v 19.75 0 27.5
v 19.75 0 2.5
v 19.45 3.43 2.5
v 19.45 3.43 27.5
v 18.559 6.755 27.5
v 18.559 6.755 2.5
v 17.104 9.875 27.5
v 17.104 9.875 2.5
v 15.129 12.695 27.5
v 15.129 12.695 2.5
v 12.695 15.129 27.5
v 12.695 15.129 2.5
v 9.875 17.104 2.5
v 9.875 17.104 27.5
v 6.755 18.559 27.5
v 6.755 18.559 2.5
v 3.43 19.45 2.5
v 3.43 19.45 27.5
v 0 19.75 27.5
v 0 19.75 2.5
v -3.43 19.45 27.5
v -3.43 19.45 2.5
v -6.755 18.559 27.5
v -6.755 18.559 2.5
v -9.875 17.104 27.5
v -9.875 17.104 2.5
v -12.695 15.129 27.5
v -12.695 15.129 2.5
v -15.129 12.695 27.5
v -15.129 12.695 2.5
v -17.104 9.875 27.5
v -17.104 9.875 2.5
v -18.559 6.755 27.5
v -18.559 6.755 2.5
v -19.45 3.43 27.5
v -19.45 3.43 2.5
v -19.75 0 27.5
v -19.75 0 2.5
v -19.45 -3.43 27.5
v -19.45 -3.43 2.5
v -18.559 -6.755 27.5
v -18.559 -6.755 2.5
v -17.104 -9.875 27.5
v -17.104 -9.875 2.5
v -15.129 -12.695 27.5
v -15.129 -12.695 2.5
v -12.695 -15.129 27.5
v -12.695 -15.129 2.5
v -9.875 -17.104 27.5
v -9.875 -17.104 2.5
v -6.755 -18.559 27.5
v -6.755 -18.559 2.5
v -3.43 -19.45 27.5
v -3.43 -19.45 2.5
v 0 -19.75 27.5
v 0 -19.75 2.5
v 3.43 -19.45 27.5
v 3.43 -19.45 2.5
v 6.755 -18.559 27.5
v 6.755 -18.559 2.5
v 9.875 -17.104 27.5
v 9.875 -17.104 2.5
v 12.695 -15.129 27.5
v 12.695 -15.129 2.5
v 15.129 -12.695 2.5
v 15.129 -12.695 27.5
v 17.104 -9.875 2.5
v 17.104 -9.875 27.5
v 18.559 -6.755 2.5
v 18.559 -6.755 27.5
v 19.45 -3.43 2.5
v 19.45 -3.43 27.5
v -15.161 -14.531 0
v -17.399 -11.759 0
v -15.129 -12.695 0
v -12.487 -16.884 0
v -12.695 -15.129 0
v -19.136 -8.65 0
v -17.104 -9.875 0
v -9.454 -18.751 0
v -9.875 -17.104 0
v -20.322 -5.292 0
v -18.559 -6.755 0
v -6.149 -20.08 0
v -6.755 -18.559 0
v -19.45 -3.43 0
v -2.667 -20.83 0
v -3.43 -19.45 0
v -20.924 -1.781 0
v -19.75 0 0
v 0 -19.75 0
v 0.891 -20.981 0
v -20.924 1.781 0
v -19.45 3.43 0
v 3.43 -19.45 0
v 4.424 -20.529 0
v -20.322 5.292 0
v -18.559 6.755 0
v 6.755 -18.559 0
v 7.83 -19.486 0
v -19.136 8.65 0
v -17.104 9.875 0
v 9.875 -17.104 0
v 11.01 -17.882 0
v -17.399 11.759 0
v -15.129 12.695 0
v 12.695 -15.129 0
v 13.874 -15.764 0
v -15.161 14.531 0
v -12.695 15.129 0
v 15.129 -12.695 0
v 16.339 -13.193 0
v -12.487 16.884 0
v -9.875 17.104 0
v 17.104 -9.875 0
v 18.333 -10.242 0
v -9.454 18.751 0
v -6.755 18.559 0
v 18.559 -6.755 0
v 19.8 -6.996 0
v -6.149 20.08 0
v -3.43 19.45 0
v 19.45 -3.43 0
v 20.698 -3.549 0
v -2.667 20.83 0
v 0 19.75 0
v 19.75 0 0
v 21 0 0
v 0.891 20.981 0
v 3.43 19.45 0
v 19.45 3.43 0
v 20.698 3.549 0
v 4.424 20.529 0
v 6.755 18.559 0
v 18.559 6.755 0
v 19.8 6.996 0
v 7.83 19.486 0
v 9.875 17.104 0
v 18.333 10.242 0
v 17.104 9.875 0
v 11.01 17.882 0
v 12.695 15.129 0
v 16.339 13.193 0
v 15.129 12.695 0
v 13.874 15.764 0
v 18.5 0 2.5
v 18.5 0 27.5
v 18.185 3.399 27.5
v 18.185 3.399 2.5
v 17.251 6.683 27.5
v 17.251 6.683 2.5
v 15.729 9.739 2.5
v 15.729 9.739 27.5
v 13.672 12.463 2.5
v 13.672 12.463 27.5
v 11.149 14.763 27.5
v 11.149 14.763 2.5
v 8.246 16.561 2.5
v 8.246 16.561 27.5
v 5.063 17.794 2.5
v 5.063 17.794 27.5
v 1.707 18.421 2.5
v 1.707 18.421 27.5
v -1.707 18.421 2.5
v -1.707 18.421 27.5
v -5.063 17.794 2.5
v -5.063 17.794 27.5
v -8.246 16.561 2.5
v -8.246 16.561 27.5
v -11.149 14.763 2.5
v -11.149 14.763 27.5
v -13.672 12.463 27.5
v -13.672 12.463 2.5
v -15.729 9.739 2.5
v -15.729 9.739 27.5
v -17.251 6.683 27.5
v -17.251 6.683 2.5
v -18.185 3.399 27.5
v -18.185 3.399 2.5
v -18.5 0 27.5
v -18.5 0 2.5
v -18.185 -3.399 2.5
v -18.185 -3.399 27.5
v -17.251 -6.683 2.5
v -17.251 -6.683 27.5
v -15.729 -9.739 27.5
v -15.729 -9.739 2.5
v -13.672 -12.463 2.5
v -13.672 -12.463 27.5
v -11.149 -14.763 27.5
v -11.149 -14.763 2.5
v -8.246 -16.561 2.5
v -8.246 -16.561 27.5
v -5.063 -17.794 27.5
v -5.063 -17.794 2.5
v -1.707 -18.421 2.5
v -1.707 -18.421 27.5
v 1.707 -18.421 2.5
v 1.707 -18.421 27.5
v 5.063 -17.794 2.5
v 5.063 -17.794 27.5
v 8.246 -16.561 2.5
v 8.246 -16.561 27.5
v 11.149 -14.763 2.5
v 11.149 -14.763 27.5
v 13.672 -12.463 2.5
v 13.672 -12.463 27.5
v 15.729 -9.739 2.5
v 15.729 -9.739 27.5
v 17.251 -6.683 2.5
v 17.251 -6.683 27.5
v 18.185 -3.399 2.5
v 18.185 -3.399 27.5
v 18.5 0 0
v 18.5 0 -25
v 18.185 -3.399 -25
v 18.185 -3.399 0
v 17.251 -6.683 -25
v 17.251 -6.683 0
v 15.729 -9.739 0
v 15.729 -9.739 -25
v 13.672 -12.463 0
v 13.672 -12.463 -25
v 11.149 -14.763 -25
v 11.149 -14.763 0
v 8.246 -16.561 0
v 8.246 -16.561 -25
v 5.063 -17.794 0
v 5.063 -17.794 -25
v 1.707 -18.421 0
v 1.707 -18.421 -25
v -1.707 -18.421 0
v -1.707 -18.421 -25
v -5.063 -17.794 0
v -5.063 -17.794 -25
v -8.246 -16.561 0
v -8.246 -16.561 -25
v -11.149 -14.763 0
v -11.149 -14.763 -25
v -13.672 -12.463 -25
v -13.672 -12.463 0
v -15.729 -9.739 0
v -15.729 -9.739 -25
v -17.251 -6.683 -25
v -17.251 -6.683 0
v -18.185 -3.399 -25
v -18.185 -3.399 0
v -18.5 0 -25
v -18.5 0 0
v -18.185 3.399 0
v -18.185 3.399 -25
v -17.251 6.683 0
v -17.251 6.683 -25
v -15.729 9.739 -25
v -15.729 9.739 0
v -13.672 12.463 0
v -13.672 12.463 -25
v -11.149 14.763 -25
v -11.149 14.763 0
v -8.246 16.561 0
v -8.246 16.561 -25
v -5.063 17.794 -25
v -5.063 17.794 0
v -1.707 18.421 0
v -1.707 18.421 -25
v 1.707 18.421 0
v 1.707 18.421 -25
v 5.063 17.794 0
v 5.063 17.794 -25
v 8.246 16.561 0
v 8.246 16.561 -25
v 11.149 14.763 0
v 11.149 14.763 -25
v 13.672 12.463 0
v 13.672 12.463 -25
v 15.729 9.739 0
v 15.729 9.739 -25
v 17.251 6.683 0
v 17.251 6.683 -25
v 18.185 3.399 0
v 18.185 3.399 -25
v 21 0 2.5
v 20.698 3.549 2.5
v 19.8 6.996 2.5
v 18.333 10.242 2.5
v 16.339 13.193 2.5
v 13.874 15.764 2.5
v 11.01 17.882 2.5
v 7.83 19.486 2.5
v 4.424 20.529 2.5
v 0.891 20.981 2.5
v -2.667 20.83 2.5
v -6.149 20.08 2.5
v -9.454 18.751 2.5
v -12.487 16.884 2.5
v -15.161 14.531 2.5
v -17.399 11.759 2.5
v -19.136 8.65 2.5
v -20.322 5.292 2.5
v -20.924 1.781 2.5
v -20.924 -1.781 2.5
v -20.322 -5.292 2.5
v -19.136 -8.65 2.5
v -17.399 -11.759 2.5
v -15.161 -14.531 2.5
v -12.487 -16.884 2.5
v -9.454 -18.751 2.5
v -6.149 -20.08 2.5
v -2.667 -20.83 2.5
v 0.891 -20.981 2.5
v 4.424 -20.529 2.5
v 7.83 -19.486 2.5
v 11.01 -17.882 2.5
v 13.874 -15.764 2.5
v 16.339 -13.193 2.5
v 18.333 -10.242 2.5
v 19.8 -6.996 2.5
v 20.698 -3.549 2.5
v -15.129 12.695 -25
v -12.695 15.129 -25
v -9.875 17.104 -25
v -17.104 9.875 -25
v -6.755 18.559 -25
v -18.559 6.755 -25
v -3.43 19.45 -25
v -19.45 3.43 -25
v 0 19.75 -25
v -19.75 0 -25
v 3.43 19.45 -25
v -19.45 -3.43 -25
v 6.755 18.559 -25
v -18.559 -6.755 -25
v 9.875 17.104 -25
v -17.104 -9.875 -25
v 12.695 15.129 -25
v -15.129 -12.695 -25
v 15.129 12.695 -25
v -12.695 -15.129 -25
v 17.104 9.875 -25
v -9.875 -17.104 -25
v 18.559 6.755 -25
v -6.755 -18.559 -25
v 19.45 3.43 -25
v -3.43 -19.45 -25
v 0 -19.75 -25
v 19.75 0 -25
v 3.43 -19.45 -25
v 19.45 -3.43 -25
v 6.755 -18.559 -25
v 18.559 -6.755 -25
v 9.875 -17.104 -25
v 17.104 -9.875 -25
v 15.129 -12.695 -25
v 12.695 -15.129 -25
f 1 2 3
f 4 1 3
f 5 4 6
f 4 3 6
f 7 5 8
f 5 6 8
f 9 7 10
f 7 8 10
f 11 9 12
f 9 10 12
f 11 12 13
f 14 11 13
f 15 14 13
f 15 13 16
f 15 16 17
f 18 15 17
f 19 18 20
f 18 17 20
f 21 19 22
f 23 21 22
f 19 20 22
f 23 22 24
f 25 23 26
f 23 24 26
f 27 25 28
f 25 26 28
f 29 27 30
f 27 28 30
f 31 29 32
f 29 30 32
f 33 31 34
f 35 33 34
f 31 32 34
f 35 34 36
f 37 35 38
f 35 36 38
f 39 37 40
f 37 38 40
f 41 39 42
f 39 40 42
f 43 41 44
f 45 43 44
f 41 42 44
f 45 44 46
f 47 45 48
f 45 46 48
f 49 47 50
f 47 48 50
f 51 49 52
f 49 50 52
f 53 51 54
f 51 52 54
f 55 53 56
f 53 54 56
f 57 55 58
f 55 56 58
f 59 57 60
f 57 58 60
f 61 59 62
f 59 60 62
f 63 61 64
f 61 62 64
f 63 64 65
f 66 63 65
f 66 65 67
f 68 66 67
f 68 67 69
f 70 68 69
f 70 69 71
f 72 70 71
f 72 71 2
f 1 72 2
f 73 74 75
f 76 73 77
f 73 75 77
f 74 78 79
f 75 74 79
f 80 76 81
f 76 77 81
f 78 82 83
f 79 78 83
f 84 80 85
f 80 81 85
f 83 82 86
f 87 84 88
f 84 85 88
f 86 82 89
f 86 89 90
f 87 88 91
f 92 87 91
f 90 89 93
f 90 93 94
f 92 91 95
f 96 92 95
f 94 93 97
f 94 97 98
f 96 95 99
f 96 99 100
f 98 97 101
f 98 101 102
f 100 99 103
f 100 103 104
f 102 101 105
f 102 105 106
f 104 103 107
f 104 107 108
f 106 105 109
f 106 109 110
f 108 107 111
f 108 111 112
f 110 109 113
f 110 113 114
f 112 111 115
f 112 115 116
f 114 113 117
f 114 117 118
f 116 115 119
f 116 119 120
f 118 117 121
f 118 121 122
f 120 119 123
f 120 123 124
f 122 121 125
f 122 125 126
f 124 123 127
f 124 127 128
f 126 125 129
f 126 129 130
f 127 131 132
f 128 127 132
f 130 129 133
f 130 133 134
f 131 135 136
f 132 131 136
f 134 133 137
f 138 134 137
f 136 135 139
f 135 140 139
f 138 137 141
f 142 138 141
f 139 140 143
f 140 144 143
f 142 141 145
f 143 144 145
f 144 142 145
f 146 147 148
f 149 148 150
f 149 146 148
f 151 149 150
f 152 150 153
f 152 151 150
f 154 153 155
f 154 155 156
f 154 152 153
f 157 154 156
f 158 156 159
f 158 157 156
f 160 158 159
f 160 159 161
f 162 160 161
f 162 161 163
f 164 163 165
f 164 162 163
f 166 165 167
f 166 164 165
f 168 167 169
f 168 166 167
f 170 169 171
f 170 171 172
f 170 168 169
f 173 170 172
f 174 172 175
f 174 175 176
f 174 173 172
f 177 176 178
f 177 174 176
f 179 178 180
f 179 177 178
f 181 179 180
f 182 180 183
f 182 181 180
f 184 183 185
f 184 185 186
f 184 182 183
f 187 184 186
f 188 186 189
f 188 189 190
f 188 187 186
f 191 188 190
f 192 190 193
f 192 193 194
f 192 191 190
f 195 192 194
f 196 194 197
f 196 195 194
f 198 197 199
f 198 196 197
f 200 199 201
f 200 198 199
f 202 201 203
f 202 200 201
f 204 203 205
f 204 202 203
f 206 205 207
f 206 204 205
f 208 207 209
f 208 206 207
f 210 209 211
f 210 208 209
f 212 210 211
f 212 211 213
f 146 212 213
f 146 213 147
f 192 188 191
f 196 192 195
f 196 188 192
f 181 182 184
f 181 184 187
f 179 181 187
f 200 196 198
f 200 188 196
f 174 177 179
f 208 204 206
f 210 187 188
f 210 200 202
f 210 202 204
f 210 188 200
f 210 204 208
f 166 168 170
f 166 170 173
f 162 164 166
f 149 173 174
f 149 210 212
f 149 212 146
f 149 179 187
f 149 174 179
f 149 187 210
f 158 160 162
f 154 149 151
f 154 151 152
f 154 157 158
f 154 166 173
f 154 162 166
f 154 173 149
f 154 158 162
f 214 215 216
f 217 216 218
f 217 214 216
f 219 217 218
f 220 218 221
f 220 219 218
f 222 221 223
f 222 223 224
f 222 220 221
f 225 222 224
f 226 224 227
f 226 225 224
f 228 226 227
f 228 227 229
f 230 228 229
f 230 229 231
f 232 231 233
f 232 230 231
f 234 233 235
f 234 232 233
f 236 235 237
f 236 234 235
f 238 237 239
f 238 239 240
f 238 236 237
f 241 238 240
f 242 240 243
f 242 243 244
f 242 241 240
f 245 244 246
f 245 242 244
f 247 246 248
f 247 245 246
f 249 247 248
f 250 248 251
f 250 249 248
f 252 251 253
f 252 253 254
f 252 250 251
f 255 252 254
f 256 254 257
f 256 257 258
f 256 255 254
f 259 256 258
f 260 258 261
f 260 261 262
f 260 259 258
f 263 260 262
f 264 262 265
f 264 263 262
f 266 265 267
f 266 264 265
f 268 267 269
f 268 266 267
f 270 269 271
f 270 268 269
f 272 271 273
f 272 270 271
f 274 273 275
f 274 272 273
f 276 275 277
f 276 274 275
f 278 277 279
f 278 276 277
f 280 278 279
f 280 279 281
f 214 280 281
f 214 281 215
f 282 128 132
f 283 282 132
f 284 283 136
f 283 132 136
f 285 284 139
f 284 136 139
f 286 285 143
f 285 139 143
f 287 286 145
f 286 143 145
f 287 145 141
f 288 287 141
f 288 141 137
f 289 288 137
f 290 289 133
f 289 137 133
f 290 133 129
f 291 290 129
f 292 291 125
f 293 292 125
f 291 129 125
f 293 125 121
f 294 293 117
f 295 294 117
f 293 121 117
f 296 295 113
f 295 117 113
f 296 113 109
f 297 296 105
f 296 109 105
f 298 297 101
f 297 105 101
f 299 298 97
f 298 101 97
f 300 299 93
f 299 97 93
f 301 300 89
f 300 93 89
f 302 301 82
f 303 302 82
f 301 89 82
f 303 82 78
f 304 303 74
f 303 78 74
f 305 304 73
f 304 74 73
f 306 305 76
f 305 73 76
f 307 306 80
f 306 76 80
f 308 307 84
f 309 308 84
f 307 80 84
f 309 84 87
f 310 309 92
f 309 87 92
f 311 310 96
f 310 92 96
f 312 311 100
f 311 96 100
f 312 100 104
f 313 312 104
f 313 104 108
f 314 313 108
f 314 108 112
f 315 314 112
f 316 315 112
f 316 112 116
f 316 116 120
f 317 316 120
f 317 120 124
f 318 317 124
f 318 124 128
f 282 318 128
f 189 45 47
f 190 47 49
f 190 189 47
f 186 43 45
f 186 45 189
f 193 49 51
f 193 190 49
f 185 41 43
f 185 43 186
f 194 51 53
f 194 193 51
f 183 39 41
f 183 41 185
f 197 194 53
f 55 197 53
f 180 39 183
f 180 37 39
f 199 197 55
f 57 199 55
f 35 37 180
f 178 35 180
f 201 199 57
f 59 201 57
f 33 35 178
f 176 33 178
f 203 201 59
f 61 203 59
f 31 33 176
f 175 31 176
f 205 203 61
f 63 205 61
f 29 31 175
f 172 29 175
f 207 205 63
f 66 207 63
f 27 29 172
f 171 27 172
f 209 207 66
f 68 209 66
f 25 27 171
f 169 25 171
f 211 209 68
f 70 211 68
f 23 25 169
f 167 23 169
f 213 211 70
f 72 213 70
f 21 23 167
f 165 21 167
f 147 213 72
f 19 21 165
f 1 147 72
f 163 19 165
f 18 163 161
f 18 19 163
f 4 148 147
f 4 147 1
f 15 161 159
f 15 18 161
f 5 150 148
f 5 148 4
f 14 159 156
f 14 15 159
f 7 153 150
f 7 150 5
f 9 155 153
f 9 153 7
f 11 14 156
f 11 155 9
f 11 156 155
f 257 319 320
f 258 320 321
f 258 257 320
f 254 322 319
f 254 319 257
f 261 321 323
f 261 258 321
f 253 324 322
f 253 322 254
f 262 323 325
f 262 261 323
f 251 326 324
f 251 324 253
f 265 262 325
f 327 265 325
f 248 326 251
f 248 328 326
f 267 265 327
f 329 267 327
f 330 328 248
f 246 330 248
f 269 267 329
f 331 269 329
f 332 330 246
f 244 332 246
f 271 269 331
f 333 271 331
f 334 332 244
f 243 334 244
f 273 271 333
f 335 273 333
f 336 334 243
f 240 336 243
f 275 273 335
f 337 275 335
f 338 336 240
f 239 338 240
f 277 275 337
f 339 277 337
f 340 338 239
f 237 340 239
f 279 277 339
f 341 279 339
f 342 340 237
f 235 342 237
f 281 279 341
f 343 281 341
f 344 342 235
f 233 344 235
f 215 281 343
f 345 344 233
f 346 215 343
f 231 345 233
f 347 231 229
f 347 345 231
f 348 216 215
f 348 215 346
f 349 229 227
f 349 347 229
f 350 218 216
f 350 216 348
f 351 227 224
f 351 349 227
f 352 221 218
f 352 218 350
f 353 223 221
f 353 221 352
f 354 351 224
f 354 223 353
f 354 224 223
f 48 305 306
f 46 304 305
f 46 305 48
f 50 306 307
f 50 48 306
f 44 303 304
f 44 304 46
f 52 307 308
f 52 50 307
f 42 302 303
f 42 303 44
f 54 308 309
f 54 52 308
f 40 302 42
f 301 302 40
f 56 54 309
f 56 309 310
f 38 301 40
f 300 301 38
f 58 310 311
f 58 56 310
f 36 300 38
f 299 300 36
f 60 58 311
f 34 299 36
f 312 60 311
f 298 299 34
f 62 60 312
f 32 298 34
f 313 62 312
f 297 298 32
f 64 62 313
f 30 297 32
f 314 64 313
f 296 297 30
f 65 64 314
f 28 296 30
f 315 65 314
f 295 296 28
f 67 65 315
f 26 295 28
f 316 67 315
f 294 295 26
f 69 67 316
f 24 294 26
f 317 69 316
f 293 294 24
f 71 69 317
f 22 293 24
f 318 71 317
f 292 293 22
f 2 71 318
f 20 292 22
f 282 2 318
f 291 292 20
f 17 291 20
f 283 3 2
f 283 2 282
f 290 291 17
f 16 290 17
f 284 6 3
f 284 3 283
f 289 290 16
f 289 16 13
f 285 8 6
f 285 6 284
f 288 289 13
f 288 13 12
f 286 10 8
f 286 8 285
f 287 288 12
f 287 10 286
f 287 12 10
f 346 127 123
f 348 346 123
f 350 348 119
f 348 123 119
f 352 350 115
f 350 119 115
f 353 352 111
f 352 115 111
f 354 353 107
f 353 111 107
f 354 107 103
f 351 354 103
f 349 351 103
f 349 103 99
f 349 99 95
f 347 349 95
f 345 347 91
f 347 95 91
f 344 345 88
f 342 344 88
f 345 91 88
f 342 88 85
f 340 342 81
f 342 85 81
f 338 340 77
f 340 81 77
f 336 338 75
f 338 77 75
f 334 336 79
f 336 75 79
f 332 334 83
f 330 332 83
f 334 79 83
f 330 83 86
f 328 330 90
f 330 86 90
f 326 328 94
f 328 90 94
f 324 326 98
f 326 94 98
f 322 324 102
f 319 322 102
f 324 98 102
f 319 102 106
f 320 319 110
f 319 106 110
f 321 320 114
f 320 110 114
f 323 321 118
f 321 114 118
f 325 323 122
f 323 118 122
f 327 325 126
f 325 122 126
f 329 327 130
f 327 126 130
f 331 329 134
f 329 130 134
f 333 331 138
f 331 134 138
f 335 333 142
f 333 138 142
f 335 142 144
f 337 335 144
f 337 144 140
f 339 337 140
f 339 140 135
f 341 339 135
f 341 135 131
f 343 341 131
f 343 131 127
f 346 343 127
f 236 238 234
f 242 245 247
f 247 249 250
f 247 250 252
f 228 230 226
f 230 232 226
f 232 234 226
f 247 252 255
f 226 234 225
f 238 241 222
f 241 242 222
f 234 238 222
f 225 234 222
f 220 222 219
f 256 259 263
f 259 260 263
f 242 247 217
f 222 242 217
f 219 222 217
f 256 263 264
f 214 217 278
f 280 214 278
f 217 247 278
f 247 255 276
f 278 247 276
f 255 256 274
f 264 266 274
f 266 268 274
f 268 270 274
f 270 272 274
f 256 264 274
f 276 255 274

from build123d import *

# Parameters (mm, degrees)
F0_R     = 21
F1_DEPTH = 2.5
F3_R     = 19.75
F3_R_2   = 18.5
F4_DEPTH = 25
F6_R     = 19.75
F6_R_2   = 18.5
F7_DEPTH = 25


with BuildPart() as f1:
    # F0 (on Top) → F1 (new body)
    with BuildSketch(Plane.XY):
        Circle(F0_R)
    extrude(amount=F1_DEPTH)

    # F3 (on face) → F4 (join)
    with BuildSketch(Plane(origin=(0, 0, 0), x_dir=(1, 0, 0), z_dir=(0, 0, -1))):
        Circle(F3_R)
        Circle(F3_R_2, mode=Mode.SUBTRACT)
    extrude(amount=F4_DEPTH)

    # F6 (on face) → F7 (join)
    with BuildSketch(Plane.XY.offset(2.5)):
        Circle(F6_R)
        Circle(F6_R_2, mode=Mode.SUBTRACT)
    extrude(amount=F7_DEPTH)


solid = f1.part
